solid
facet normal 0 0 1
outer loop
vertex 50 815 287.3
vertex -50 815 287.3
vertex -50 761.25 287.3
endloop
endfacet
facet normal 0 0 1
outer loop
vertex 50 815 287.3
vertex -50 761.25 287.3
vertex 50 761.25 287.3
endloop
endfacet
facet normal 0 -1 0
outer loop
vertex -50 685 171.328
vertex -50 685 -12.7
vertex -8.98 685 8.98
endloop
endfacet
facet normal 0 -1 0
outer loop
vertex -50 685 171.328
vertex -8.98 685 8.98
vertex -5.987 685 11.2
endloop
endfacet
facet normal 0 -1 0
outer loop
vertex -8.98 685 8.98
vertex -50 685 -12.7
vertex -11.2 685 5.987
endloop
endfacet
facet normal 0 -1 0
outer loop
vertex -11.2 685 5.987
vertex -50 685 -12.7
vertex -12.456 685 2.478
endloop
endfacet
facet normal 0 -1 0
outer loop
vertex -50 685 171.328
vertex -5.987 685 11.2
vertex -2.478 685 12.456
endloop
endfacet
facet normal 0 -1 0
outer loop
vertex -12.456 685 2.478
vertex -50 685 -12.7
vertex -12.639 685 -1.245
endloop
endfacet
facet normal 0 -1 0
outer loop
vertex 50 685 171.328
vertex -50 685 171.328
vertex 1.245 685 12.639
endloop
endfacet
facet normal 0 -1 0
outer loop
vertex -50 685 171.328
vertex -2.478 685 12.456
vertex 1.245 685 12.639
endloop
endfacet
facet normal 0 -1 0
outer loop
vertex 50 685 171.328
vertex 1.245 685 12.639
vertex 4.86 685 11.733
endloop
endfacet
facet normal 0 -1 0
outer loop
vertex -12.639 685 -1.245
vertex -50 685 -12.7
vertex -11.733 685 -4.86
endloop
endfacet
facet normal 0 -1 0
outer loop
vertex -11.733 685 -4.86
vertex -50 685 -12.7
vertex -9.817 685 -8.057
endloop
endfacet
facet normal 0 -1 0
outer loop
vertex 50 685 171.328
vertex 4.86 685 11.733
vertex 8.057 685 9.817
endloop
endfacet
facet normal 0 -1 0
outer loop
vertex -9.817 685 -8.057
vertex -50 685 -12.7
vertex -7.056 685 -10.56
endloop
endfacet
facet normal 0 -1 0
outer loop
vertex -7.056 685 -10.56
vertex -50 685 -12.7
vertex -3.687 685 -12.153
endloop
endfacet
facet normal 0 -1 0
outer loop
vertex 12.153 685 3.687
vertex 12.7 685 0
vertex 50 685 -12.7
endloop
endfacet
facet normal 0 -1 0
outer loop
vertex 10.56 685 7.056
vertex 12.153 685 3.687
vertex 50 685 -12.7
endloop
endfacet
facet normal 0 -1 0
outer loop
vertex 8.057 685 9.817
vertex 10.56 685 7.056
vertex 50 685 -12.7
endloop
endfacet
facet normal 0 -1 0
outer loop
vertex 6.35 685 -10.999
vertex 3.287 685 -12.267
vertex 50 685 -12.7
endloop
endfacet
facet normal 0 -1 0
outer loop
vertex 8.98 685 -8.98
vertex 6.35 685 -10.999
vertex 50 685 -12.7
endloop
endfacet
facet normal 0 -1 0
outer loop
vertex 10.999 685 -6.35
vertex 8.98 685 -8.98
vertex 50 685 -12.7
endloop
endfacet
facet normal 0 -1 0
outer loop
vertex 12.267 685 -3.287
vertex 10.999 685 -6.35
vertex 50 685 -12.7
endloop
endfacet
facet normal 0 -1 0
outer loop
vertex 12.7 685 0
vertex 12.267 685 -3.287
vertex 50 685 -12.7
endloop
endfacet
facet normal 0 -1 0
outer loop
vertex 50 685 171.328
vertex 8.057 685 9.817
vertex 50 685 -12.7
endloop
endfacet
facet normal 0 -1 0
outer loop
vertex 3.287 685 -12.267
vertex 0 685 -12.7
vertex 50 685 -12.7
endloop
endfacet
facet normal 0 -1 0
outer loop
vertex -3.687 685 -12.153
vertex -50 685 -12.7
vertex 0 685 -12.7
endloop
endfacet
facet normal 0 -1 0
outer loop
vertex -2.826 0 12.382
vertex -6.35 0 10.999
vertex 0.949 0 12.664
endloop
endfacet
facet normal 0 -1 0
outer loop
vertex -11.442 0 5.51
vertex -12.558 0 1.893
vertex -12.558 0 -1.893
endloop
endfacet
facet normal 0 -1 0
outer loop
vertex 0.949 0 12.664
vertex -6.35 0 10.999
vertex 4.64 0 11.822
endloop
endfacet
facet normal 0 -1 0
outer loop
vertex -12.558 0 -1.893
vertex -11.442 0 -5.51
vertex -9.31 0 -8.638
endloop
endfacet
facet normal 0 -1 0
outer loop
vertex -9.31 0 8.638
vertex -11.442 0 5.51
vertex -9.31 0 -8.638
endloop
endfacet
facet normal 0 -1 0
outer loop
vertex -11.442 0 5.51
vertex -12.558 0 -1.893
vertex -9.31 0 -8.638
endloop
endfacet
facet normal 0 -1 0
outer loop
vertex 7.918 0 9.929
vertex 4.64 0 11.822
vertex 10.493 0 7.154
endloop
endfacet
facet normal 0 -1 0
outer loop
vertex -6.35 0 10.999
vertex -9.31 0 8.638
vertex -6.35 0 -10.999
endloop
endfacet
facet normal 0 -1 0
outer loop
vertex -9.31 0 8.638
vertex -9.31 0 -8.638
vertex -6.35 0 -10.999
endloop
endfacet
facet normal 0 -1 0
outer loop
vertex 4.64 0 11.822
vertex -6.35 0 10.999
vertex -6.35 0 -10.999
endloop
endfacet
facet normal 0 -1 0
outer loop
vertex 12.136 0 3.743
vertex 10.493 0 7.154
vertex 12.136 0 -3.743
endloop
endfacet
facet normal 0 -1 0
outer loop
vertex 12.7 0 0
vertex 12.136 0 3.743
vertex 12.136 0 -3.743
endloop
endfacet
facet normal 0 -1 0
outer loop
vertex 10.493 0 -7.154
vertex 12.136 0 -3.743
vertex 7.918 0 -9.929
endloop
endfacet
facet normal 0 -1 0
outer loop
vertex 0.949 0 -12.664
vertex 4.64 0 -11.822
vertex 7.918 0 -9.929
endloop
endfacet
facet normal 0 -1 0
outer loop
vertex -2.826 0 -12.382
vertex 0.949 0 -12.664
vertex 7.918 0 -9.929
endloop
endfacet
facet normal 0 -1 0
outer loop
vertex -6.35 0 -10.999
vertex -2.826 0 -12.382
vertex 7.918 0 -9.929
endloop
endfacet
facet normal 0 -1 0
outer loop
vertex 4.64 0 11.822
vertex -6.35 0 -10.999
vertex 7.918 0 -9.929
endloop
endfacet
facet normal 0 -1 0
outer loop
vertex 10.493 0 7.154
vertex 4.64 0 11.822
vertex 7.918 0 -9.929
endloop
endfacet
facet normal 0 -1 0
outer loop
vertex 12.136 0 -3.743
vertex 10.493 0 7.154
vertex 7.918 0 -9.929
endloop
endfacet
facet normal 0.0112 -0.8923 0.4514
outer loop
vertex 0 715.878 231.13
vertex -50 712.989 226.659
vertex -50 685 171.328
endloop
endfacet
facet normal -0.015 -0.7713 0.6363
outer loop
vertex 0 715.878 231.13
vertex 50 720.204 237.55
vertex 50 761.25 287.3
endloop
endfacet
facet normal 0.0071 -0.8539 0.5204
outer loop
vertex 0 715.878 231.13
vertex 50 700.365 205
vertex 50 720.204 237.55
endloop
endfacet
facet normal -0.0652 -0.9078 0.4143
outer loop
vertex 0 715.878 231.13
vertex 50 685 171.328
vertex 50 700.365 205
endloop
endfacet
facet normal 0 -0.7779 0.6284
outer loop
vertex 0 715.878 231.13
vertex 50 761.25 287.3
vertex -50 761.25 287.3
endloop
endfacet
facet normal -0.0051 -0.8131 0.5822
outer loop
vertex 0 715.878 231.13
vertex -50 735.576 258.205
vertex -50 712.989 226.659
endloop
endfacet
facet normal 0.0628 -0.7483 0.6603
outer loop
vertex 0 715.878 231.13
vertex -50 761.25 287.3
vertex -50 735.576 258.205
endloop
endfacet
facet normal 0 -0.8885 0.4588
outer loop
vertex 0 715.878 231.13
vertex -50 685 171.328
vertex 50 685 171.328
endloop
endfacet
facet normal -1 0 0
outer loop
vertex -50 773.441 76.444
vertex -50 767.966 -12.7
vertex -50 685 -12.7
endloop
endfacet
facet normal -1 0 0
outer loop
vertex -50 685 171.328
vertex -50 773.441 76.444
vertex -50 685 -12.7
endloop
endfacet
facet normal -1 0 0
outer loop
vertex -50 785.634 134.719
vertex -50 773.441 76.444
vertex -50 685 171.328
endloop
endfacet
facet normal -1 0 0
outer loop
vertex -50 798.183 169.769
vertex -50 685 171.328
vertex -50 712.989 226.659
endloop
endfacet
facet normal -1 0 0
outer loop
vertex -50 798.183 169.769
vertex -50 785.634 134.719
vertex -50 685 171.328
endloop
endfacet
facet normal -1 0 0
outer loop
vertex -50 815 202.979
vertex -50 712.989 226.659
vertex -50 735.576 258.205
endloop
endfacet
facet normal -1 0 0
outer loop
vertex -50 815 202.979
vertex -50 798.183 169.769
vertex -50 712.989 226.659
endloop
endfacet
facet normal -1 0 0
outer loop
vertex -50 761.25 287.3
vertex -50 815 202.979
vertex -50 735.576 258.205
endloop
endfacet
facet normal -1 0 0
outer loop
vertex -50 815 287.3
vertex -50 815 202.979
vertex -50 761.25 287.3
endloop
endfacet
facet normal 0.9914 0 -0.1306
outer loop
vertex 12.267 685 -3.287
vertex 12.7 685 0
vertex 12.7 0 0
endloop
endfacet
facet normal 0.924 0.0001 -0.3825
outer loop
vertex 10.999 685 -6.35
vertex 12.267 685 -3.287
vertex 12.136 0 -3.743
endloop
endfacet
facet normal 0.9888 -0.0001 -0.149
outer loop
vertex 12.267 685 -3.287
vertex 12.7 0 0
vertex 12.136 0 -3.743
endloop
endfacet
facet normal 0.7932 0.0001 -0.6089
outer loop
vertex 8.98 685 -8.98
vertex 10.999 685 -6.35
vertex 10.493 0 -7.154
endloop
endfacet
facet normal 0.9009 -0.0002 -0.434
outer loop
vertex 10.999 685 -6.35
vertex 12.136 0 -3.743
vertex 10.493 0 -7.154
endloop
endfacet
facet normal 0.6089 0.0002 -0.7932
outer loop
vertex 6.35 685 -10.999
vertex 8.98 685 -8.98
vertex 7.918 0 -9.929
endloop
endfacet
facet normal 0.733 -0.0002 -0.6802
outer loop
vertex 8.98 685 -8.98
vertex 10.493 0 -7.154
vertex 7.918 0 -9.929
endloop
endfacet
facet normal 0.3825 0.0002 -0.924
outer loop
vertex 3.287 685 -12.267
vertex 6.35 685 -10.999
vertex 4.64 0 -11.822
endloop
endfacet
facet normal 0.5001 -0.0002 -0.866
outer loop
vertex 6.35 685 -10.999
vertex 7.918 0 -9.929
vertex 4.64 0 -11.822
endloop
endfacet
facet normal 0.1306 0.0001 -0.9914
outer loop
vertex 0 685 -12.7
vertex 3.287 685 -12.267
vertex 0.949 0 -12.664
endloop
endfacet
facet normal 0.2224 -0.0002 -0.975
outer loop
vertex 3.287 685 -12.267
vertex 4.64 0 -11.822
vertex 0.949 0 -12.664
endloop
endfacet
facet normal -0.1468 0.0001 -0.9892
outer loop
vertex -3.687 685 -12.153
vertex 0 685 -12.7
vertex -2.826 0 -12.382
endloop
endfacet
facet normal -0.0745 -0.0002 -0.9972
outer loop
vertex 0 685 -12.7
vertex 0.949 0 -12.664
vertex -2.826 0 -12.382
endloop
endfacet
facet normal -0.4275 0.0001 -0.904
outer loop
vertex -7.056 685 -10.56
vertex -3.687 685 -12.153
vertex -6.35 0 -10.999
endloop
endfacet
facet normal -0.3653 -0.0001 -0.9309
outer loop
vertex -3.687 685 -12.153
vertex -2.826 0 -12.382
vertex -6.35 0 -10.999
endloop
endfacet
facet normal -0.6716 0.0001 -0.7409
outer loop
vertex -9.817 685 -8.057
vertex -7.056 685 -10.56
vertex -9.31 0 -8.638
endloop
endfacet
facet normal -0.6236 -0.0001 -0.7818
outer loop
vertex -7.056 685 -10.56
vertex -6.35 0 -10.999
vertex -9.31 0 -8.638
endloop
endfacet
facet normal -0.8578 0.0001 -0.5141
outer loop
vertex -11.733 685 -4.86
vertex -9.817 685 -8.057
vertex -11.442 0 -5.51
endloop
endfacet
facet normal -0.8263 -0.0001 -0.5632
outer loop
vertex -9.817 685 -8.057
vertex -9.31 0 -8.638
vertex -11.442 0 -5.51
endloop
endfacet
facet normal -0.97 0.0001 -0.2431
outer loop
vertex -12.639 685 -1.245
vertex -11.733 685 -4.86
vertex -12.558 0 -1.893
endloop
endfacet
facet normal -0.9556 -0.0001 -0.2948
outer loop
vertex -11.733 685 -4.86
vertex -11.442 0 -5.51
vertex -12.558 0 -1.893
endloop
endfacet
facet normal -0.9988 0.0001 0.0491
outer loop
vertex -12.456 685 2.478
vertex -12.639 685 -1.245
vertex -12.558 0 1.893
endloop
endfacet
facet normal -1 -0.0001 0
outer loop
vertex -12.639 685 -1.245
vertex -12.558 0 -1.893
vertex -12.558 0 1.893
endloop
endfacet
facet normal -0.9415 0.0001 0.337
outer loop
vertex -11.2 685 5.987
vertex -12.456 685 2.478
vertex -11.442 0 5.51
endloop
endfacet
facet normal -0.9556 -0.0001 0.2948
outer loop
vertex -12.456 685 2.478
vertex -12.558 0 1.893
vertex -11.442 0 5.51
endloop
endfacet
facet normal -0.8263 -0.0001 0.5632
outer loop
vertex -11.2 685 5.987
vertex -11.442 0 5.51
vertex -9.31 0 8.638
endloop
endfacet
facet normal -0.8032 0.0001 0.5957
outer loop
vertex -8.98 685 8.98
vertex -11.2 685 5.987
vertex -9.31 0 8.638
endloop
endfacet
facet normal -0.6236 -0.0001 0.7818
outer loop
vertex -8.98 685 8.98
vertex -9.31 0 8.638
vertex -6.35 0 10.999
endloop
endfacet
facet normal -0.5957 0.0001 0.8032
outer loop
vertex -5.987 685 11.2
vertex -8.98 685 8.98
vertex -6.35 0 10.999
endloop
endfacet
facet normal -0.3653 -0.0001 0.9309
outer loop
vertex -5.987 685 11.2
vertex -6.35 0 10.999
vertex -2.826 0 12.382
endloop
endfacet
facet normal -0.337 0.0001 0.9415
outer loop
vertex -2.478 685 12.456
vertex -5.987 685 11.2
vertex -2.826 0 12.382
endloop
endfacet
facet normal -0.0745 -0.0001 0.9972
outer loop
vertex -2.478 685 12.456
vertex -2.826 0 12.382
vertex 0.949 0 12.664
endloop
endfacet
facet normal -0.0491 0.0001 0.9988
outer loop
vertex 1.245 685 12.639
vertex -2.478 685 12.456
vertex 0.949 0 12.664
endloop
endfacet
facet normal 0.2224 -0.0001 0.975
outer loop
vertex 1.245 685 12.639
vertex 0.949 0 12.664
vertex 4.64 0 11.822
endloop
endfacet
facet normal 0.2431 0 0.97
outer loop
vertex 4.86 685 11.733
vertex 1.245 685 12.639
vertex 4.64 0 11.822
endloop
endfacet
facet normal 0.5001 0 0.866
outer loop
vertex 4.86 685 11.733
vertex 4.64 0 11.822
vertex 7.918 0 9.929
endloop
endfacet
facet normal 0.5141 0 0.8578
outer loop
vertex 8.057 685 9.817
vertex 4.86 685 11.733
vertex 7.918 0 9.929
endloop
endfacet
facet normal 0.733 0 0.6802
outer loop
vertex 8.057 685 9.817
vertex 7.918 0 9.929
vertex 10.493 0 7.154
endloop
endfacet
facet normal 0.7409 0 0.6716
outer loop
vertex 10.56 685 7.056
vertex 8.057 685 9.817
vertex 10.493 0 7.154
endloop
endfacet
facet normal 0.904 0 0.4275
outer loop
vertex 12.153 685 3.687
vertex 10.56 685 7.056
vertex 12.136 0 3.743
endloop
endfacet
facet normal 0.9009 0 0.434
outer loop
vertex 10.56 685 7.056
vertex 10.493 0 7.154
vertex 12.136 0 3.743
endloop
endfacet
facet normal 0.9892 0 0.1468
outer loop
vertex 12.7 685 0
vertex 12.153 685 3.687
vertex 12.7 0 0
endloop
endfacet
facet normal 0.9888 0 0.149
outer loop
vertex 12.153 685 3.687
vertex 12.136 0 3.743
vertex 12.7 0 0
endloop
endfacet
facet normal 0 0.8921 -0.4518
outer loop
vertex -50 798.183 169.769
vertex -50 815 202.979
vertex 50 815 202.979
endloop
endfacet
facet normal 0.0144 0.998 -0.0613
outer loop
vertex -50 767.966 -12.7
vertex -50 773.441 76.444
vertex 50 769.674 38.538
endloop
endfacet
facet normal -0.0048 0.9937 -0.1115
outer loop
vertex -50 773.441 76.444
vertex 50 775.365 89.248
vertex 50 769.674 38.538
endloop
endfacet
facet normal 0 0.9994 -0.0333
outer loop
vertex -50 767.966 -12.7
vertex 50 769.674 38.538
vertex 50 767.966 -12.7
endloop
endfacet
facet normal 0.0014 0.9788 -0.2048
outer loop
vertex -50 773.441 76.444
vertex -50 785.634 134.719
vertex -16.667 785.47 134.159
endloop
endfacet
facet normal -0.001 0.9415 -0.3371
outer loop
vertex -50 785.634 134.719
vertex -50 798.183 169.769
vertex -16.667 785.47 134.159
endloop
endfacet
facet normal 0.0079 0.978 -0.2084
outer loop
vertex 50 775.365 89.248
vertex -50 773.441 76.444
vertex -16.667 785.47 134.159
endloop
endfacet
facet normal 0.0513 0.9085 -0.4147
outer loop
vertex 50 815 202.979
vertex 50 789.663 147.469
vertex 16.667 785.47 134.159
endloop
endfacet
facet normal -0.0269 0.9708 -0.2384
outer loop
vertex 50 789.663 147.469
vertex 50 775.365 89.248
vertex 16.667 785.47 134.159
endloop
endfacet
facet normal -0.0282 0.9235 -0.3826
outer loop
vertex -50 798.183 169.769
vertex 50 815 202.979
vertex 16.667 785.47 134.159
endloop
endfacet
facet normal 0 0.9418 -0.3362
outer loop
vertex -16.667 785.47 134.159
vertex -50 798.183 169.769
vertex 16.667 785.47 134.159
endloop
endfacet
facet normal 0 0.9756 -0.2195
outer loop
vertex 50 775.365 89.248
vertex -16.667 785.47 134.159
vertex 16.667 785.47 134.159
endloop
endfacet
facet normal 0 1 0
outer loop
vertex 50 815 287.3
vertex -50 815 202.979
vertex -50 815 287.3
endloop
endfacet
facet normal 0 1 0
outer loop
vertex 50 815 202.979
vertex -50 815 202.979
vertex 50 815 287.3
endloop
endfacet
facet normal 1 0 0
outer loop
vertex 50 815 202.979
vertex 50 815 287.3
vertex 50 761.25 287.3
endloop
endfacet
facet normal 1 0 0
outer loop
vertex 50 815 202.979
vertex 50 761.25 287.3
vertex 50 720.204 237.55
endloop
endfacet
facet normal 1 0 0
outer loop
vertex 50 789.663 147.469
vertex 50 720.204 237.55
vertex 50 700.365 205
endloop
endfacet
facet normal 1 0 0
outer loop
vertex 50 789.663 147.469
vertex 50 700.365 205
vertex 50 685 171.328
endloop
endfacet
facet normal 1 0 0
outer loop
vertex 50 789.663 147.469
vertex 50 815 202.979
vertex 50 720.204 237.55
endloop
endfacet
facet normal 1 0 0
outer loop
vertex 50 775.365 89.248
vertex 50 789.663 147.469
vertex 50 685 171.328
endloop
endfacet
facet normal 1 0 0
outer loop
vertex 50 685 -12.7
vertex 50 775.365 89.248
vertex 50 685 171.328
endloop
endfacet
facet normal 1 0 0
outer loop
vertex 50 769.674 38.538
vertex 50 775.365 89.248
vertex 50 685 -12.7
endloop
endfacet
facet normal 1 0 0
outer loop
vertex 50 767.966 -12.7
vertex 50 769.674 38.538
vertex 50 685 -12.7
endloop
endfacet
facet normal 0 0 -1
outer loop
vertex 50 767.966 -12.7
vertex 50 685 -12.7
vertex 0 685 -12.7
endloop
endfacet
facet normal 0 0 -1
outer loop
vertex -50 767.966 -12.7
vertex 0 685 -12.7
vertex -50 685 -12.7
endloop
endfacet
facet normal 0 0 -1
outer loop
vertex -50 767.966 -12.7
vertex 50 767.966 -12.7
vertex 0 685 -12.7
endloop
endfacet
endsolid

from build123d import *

# Parameters (mm, degrees)
SKETCH1_R           = 12.7
BOSS_EXTRUDE1_DEPTH = 815
BOSS_EXTRUDE2_DEPTH = 130
CUT_EXTRUDE1_DEPTH  = 101


with BuildPart() as part:
    # Sketch1 → Boss-Extrude1 (new body)
    with BuildSketch(Plane(origin=(0, 0, 0), x_dir=(1, 0, 0), z_dir=(0, 1, 0))):
        Circle(SKETCH1_R)
    extrude(amount=BOSS_EXTRUDE1_DEPTH)

    # Sketch3 → Boss-Extrude2 (add)
    with BuildSketch(Plane(origin=(0, 815, 0), x_dir=(1, 0, 0), z_dir=(0, 1, 0))):
        Polygon((0, 12.7), (-50, 12.7), (-50, -287.3), (50, -287.3), (50, 12.7), align=None)
    extrude(amount=-BOSS_EXTRUDE2_DEPTH)

    # Sketch5 → Cut-Extrude1 (cut, through all)
    with BuildSketch(Plane(origin=(50, 0, 0), x_dir=(0, 0, -1), z_dir=(1, 0, 0))):
        with BuildLine():
            Line((-202.978744698, 815), (-272.862835617, 879.498966907))
            Line((-272.862835617, 879.498966907), (20.796594256, 879.498966907))
            Line((20.796594256, 879.498966907), (67.402863197, 768.490286219))
            add(Edge.make_bspline(
                [(-202.978744698, 815), (-120.413068906, 766.120158396), (-24.484780787, 766.761518937), (67.402863197, 768.490286219)],
                knots=[0, 0, 0, 0, 1, 1, 1, 1], degree=3))
        make_face()
        with BuildLine():
            Line((-301.698496964, 775.832281678), (-354.195317799, 601.764613469))
            Line((-354.195317799, 601.764613469), (-151.062921175, 574.818479223))
            Line((-151.062921175, 574.818479223), (-63.792664277, 665.742090059))
            add(Edge.make_bspline(
                [(-301.698496964, 775.832281678), (-196.773017202, 664.797399326), (-63.792664277, 665.742090059)],
                knots=[0, 0, 0, 1, 1, 1], degree=2))
        make_face()
    extrude(amount=-CUT_EXTRUDE1_DEPTH, mode=Mode.SUBTRACT)


solid = part.part
